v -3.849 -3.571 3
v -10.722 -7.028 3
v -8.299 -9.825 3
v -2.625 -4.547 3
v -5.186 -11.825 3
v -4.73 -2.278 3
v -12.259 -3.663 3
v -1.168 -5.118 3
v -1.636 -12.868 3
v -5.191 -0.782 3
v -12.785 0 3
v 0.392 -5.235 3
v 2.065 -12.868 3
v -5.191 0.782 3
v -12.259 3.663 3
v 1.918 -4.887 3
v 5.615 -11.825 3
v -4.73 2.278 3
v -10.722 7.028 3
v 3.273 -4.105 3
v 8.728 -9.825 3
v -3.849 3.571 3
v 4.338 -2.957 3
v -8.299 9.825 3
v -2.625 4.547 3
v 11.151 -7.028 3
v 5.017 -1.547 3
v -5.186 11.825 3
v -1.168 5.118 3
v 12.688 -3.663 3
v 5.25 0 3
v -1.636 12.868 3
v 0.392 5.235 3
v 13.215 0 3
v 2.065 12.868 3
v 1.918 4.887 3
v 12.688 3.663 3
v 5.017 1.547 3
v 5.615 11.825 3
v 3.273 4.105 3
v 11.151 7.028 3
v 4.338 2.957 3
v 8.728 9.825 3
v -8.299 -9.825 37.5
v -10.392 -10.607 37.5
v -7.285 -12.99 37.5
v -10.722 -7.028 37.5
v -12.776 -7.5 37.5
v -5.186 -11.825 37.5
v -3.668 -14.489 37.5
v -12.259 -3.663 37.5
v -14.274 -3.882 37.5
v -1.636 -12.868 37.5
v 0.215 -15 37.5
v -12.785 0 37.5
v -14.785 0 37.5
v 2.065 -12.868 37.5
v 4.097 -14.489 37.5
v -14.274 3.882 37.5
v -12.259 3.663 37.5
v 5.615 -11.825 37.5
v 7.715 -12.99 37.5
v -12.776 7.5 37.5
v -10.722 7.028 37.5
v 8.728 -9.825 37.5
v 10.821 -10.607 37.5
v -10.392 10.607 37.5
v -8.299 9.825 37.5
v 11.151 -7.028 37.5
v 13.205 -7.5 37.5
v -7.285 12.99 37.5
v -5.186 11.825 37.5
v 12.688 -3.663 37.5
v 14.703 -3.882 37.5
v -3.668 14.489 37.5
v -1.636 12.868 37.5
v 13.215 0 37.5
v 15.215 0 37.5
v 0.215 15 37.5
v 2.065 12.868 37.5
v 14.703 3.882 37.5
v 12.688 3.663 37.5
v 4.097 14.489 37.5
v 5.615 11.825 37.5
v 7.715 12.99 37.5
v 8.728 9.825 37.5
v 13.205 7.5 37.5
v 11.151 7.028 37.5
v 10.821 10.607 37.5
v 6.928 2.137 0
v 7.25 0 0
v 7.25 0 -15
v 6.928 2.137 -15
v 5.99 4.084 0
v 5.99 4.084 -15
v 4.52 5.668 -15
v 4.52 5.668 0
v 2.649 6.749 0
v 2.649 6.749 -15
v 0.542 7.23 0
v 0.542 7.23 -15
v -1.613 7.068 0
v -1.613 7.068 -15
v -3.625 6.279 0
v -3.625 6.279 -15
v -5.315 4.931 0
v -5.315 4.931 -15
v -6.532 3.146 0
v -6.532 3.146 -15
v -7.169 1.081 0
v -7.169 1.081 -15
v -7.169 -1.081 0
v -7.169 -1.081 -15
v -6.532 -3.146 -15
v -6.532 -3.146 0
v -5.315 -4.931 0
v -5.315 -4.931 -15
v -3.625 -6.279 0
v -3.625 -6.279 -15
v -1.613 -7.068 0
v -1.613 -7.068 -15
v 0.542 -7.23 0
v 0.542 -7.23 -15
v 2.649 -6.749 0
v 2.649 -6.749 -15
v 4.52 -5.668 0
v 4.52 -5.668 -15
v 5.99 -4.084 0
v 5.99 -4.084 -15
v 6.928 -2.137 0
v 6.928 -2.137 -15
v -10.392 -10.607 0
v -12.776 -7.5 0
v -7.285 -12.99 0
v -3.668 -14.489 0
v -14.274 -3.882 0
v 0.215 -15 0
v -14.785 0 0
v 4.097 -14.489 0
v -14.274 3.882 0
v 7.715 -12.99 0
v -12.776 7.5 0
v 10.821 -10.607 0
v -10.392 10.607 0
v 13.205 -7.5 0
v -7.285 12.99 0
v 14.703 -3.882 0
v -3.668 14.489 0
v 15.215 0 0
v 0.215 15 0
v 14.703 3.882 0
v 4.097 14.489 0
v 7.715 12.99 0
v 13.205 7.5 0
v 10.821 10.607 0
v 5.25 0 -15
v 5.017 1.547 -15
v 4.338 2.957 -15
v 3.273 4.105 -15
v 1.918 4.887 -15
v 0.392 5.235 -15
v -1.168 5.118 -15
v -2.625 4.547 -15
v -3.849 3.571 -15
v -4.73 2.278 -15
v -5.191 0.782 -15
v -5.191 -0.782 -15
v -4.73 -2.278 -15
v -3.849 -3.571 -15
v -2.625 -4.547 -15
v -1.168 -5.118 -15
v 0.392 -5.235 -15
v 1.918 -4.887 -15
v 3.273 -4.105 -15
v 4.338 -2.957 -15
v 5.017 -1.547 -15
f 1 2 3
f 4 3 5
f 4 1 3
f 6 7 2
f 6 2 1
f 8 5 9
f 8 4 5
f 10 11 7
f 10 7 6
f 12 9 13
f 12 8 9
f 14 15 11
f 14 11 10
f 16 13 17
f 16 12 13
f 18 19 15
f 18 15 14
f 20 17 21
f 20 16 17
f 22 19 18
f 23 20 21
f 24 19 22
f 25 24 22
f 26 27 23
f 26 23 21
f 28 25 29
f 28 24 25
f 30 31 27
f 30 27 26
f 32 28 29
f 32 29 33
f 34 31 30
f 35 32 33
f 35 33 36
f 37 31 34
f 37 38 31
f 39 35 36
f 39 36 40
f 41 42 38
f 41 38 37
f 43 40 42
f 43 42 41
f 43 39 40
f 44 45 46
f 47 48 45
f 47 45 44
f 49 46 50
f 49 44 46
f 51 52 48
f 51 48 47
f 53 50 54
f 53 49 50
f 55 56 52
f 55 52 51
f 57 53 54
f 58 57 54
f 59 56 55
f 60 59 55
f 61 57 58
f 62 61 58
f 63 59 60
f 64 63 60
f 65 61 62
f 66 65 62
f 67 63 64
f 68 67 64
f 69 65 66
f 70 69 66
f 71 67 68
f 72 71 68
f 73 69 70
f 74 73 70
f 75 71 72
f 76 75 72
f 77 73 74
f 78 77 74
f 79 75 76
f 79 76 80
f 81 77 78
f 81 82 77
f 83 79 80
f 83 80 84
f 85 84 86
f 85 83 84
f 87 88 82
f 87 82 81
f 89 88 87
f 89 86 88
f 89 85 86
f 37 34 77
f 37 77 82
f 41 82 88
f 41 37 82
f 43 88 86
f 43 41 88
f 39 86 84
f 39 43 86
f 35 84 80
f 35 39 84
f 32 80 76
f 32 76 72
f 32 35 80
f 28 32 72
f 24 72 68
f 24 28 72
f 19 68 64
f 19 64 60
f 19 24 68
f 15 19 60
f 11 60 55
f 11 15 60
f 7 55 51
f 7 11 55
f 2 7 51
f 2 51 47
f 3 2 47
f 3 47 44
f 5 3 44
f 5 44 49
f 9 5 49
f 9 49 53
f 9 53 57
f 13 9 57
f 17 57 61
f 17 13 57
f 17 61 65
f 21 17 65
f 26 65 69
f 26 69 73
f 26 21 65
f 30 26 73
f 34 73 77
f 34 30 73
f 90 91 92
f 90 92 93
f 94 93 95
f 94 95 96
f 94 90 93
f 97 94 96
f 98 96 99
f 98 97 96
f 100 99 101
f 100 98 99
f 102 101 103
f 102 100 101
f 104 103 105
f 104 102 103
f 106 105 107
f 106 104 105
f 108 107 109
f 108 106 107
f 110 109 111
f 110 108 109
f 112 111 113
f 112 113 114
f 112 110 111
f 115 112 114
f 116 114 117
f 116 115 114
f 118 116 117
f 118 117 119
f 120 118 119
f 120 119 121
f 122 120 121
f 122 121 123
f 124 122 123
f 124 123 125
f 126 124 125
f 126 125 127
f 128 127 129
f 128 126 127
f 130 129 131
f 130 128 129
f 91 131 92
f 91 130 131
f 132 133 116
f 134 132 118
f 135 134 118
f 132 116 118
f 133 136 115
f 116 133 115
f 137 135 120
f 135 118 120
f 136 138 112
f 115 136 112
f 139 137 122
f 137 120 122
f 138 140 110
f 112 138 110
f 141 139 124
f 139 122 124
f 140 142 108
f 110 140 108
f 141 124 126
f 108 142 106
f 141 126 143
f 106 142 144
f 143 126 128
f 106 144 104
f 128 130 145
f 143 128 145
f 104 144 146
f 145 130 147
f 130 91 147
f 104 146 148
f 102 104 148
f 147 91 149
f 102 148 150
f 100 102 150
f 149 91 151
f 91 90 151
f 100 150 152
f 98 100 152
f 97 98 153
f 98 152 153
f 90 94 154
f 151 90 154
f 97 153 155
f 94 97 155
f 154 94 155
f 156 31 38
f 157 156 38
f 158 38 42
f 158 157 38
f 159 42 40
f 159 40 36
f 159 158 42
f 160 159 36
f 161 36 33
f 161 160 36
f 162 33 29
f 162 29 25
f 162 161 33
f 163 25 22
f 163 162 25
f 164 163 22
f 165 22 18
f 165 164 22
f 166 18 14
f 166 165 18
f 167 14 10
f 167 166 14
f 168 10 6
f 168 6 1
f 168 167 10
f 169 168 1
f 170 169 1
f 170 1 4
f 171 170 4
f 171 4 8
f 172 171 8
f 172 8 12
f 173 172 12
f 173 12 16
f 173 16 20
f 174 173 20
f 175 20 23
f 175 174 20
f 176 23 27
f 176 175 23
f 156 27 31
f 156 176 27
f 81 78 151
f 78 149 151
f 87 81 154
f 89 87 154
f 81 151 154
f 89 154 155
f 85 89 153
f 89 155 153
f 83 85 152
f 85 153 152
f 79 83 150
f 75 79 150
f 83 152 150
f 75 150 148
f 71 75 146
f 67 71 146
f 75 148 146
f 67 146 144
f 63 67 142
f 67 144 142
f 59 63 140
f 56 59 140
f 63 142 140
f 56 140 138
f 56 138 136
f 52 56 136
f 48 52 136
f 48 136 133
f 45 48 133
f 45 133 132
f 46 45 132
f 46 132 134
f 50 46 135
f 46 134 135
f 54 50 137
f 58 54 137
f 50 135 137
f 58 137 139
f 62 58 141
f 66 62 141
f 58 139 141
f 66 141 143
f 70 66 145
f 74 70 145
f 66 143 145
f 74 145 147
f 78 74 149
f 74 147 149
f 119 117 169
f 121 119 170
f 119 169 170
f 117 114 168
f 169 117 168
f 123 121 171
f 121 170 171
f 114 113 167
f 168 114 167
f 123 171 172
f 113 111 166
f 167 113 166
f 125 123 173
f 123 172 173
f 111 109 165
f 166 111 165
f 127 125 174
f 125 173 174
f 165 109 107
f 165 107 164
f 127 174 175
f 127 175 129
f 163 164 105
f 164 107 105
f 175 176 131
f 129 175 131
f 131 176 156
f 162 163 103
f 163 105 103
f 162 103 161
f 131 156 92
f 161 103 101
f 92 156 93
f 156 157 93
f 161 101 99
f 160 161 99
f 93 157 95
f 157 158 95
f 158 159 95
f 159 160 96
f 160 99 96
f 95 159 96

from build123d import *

# Parameters (mm, degrees)
F0_R     = 7.25
F0_R_2   = 5.25
F1_DEPTH = 15
F2_R     = 15
F2_R_2   = 5.25
F3_DEPTH = 3
F4_R     = 15
F4_R_2   = 13
F5_DEPTH = 34.5


with BuildPart() as f1:
    # F0 (on Top) → F1 (new body)
    with BuildSketch(Plane.XY):
        Circle(F0_R)
        Circle(F0_R_2, mode=Mode.SUBTRACT)
    extrude(amount=-F1_DEPTH)

    # F2 (on face) → F3 (join)
    with BuildSketch(Plane.XY):
        with Locations((0.214589, 0)):
            Circle(F2_R)
        Circle(F2_R_2, mode=Mode.SUBTRACT)
    extrude(amount=F3_DEPTH)

    # F4 (on face) → F5 (join)
    with BuildSketch(Plane.XY.offset(3)):
        with Locations((0.214589, 0)):
            Circle(F4_R)
        with Locations((0.214589, 0)):
            Circle(F4_R_2, mode=Mode.SUBTRACT)
    extrude(amount=F5_DEPTH)


solid = f1.part
